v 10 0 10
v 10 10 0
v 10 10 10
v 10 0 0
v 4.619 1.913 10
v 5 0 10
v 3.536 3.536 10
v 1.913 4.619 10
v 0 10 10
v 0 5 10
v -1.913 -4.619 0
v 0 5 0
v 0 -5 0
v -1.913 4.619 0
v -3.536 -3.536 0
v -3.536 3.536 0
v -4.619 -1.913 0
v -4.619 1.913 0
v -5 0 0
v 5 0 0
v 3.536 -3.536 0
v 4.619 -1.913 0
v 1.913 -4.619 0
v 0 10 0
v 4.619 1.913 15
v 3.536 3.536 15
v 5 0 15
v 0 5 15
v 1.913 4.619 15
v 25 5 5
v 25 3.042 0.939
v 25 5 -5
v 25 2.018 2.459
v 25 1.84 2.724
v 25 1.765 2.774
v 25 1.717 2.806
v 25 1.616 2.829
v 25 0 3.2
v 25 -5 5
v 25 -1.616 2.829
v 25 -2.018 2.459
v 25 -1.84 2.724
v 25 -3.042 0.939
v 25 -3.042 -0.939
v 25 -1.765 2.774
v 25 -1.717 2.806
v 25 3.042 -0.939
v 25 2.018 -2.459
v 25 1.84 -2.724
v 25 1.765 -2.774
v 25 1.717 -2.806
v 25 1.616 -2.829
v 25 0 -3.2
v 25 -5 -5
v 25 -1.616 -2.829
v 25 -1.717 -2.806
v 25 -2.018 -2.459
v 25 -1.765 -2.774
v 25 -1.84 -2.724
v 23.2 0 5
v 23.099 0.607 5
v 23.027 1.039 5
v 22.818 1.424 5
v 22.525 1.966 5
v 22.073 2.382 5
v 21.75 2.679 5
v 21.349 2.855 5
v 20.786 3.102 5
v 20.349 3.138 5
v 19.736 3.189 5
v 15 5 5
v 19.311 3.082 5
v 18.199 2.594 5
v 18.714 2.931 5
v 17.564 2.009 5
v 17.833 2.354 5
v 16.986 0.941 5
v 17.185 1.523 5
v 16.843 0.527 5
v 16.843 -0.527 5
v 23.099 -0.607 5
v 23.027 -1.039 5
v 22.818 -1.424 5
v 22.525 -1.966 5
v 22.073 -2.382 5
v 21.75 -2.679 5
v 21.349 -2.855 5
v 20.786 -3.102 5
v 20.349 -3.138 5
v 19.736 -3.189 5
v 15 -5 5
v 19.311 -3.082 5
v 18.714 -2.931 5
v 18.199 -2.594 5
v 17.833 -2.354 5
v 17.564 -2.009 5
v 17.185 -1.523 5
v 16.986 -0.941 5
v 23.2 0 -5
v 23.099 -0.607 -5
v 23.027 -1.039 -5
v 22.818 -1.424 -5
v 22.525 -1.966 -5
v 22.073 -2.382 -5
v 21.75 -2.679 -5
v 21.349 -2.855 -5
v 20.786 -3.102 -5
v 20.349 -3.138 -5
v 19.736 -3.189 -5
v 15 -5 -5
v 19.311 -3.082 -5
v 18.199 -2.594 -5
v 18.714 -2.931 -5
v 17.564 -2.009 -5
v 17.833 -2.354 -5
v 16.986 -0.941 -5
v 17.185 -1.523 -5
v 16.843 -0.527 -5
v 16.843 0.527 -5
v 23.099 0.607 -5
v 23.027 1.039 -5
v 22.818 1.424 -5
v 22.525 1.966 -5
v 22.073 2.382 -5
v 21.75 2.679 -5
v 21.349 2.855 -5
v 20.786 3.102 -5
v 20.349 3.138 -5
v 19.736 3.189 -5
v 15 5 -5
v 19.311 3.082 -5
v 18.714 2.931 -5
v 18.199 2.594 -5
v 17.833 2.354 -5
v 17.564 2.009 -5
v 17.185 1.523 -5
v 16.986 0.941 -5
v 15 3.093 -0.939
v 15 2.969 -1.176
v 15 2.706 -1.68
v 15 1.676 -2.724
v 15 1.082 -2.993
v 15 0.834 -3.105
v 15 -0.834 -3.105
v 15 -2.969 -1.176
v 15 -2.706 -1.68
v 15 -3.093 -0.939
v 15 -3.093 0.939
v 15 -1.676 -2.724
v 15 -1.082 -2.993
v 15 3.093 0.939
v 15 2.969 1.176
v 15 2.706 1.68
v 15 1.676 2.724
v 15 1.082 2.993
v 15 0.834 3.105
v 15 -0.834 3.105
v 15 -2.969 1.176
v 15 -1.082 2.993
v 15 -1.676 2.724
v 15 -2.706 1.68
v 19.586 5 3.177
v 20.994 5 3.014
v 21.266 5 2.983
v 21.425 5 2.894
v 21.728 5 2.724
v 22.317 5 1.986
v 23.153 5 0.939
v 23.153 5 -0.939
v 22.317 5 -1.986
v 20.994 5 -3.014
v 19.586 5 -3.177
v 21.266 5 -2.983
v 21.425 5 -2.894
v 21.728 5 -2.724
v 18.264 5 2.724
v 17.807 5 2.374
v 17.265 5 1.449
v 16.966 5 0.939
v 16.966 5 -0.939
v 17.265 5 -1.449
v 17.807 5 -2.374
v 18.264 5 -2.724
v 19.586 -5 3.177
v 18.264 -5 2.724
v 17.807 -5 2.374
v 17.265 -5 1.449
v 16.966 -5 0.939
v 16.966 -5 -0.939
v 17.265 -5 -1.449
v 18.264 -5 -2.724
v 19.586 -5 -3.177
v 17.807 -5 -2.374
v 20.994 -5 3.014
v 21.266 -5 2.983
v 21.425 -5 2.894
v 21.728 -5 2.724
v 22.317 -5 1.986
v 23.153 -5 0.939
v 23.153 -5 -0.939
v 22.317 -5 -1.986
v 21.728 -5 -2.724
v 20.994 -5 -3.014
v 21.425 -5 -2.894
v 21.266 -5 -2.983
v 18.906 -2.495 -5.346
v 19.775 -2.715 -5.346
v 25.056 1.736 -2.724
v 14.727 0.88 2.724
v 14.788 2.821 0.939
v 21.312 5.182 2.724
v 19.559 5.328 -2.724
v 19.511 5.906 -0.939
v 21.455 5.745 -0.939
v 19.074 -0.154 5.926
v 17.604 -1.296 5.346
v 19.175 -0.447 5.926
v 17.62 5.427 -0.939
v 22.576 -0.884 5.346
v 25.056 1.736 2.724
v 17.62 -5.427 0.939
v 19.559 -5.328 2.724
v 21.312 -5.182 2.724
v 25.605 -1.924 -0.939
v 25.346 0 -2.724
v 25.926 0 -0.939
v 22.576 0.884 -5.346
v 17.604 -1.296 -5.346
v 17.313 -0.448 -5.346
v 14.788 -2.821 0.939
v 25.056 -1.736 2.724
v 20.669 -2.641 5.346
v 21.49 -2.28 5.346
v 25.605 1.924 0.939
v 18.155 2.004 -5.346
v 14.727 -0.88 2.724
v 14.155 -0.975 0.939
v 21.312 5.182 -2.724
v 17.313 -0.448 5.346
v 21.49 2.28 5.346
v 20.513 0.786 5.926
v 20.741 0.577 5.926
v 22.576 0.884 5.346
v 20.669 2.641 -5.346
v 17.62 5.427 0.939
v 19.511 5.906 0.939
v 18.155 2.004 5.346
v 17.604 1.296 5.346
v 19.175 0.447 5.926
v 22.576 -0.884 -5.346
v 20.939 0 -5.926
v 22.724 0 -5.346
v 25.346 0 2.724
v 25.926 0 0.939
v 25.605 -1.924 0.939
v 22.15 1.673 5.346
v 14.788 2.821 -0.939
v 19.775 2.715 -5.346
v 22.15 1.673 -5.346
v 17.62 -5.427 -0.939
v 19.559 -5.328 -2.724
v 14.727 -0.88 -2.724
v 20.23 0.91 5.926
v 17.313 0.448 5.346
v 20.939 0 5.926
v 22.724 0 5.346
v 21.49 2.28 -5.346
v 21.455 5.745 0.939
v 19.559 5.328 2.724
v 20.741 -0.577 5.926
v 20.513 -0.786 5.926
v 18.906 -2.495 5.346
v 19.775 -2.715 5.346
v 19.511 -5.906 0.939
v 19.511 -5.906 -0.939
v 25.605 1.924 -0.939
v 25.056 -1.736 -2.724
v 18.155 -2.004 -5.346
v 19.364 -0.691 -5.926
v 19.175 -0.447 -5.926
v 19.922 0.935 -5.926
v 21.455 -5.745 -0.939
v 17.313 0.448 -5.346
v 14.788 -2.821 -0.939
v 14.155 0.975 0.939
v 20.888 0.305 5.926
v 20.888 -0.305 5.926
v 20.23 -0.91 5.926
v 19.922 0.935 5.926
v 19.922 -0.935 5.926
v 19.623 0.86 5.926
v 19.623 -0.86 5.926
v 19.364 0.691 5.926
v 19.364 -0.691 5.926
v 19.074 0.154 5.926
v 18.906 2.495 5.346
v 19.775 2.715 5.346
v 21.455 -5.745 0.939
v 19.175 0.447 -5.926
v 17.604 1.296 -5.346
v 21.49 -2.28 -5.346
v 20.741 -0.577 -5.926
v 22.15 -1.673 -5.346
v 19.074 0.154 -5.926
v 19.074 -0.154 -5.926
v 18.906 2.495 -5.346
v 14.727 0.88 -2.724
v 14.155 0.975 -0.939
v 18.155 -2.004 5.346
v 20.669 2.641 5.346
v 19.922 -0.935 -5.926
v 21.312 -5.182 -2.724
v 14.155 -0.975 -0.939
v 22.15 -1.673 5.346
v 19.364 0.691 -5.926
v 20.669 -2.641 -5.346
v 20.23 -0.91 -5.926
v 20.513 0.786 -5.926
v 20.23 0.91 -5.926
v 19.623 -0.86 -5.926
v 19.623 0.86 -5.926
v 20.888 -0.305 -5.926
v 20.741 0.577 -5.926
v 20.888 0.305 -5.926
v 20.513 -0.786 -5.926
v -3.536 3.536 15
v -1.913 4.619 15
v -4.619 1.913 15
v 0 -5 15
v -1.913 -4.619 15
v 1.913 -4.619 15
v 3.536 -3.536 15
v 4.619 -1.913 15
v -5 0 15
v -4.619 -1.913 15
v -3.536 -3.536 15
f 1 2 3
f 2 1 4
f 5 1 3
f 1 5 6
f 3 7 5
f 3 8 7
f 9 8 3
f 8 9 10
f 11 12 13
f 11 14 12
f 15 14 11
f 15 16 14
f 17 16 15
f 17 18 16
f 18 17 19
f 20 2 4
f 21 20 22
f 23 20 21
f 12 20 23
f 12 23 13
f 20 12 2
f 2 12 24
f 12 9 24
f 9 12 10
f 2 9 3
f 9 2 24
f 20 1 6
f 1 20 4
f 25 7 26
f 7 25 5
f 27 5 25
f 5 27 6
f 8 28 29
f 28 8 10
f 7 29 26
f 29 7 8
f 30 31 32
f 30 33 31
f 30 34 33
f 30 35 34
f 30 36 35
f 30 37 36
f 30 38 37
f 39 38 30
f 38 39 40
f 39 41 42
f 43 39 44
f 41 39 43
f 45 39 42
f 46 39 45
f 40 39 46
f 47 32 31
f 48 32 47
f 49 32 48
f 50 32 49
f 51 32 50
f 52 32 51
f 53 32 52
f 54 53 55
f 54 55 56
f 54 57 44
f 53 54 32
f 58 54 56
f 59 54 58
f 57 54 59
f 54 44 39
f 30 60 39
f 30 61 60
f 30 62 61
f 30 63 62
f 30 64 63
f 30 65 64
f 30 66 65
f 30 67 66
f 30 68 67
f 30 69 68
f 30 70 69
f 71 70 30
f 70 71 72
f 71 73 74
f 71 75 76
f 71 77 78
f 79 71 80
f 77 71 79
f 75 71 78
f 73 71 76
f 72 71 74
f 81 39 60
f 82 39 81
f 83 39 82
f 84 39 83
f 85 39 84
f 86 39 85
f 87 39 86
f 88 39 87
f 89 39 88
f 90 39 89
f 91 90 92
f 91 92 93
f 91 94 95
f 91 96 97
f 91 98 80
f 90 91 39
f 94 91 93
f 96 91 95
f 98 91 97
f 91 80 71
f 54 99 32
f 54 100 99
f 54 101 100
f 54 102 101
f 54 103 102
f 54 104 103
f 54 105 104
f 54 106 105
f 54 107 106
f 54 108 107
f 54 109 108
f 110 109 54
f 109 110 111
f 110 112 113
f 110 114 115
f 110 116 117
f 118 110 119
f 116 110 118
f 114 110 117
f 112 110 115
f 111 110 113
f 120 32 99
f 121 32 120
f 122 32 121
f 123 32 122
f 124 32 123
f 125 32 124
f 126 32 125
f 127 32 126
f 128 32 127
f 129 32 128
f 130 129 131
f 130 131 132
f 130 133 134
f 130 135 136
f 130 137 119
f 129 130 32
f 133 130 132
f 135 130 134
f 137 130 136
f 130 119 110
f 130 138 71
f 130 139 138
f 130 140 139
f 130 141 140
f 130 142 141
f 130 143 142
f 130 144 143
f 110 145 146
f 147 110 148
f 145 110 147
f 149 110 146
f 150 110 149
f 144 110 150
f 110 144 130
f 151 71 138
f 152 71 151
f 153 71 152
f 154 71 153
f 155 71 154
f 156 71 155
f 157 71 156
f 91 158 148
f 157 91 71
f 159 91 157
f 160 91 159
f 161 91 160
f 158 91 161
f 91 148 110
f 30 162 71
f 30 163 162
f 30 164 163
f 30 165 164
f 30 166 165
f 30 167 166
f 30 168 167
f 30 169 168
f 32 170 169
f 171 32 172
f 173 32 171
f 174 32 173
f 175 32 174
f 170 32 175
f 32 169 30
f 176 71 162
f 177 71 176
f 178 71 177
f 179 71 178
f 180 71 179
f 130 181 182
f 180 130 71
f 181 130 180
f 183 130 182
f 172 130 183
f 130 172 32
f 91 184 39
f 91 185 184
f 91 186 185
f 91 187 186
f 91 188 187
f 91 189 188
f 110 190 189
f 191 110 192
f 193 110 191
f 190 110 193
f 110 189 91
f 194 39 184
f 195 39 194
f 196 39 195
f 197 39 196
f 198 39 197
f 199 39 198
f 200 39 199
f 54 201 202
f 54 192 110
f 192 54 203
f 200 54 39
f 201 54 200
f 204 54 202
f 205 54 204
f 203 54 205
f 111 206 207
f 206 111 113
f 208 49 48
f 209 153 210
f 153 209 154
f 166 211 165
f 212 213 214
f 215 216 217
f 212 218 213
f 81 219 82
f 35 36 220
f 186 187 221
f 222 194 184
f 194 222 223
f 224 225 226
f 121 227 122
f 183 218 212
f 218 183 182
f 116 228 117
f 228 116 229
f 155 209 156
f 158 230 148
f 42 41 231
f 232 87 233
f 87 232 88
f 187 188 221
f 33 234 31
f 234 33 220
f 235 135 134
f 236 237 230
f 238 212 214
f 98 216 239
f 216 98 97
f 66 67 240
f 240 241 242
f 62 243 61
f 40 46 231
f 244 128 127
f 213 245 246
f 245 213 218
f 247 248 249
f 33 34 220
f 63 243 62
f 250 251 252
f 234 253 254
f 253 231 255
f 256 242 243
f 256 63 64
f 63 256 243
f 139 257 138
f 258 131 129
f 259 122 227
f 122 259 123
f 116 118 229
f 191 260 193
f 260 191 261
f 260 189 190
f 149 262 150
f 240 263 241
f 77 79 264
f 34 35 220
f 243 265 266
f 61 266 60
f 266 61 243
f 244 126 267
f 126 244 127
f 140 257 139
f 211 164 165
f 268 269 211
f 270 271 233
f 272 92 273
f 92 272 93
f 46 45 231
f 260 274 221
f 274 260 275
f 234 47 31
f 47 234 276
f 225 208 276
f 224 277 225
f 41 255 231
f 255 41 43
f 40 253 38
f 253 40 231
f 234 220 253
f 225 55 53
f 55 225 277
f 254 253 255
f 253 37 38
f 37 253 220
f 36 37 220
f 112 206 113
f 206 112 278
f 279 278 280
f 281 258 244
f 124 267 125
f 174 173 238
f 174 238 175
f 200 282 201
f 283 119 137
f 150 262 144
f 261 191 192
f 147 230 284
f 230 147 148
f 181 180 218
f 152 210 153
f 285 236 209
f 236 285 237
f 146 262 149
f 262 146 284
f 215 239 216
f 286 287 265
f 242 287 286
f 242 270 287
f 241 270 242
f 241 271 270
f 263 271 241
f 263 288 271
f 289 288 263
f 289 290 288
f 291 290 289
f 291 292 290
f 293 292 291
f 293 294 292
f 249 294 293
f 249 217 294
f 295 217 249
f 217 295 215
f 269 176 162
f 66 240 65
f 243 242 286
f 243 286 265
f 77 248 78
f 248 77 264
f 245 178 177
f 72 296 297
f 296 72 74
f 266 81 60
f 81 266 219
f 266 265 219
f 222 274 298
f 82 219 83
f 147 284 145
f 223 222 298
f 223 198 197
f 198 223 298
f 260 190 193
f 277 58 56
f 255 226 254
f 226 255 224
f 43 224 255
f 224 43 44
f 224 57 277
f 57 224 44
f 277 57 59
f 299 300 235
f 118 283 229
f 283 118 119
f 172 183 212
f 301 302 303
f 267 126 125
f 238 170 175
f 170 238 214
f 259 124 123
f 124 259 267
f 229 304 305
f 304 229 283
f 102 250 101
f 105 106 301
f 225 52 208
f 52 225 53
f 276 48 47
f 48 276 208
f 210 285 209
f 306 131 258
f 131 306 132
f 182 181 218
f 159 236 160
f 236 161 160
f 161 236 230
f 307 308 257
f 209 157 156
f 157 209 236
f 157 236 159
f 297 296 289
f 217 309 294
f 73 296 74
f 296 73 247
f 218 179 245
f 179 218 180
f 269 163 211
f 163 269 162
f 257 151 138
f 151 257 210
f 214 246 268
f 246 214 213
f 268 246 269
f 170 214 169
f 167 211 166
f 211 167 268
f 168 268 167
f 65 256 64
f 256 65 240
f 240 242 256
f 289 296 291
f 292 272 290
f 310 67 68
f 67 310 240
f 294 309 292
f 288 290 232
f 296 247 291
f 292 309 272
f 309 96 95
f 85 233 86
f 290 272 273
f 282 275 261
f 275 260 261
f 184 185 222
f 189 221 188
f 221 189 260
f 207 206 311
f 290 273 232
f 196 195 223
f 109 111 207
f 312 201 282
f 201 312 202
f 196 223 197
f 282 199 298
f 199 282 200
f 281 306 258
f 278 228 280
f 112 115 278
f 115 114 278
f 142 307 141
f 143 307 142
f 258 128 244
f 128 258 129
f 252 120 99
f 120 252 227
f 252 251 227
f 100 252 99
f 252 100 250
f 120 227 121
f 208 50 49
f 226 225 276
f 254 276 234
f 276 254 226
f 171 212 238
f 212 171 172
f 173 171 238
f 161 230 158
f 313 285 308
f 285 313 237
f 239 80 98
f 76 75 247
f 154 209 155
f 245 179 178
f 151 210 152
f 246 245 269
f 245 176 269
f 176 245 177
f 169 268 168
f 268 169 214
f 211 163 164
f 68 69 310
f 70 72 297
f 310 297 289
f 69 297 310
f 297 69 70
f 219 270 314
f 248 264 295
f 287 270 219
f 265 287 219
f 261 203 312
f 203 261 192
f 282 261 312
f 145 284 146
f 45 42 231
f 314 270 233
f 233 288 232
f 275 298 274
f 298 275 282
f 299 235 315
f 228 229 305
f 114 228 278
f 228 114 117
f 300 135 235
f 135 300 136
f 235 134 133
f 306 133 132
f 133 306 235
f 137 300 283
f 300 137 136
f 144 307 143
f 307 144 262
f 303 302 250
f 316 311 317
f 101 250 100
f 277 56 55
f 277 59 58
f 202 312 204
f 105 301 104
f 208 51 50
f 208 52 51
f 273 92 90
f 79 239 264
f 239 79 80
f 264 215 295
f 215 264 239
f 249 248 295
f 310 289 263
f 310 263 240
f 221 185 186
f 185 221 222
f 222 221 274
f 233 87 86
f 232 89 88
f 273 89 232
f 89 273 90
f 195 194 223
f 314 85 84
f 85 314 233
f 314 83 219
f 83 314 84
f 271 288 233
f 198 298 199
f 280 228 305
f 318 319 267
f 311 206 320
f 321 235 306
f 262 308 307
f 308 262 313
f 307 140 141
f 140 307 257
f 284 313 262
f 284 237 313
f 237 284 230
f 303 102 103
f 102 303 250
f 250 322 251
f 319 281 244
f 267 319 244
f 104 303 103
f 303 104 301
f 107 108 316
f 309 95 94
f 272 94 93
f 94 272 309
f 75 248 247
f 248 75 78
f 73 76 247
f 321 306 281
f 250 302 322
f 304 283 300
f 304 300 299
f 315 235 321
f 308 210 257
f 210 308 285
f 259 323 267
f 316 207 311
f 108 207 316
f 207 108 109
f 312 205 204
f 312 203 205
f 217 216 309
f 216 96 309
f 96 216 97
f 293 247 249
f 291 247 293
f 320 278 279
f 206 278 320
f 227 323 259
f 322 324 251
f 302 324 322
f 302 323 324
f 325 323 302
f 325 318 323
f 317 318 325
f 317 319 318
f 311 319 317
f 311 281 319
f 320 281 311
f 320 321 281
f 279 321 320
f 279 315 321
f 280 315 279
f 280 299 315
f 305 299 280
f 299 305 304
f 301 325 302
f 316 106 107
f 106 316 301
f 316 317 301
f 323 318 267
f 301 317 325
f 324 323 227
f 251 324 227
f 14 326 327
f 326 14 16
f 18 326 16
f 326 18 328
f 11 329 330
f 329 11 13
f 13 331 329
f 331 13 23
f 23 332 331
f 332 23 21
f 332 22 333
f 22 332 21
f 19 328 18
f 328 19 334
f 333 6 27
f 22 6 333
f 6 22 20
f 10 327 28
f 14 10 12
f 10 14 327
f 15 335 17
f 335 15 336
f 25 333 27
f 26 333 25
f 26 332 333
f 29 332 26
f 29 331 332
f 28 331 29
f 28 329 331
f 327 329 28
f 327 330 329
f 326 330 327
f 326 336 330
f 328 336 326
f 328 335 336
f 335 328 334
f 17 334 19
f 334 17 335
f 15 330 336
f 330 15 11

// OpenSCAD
color("red") {
  difference() {
    cube(10);
    cylinder(h=15, r=5);
  }
}

color("blue") {
  translate([0, 0, 0]) cylinder(h=15, r=5);
}

translate([20, 0, 0]) {
  union() {
    color("red") {
      cube(10, center=true);
    }

    color("magenta") {
      sphere(6);
    }
  }
}
  
